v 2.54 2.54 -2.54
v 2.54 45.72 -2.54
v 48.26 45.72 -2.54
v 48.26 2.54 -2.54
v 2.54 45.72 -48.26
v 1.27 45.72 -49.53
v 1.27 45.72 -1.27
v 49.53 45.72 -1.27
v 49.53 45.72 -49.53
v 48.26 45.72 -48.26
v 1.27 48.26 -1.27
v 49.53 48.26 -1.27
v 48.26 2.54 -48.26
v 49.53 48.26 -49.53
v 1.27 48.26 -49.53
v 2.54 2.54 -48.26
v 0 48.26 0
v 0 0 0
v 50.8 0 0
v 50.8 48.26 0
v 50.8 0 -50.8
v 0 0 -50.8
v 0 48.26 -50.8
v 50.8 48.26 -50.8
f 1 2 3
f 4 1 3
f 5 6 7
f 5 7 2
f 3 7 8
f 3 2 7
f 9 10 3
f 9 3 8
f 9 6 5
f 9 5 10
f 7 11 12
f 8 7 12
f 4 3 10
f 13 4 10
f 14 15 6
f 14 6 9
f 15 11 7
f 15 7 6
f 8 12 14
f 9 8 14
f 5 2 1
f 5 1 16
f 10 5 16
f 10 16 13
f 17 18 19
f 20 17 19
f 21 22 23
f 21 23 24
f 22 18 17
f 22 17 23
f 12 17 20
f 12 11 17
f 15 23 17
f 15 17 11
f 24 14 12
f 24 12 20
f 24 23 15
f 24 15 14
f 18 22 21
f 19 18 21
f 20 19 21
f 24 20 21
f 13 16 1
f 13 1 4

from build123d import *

# Parameters (mm, degrees)
SKETCH1_W           = 50.8
SKETCH1_H           = 50.8
BOSS_EXTRUDE1_DEPTH = 48.26
SKETCH2_W           = 45.72
SKETCH2_H           = 45.72
CUT_EXTRUDE1_DEPTH  = 45.72
SKETCH3_W           = 48.26
SKETCH3_H           = 48.26
CUT_EXTRUDE2_DEPTH  = 2.54


with BuildPart() as part:
    # Sketch1 → Boss-Extrude1 (new body)
    with BuildSketch(Plane(origin=(0, 0, 0), x_dir=(1, 0, 0), z_dir=(0, 1, 0))):
        with Locations((25.4, 25.4)):
            Rectangle(SKETCH1_W, SKETCH1_H)
    extrude(amount=BOSS_EXTRUDE1_DEPTH)

    # Sketch2 → Cut-Extrude1 (cut)
    with BuildSketch(Plane(origin=(0, 48.26, 0), x_dir=(1, 0, 0), z_dir=(0, 1, 0))):
        with Locations((25.4, 25.4)):
            Rectangle(SKETCH2_W, SKETCH2_H)
    extrude(amount=-CUT_EXTRUDE1_DEPTH, mode=Mode.SUBTRACT)

    # Sketch3 → Cut-Extrude2 (cut)
    with BuildSketch(Plane(origin=(0, 48.26, 0), x_dir=(1, 0, 0), z_dir=(0, 1, 0))):
        with Locations((25.4, 25.4)):
            Rectangle(SKETCH3_W, SKETCH3_H)
    extrude(amount=-CUT_EXTRUDE2_DEPTH, mode=Mode.SUBTRACT)


solid = part.part
